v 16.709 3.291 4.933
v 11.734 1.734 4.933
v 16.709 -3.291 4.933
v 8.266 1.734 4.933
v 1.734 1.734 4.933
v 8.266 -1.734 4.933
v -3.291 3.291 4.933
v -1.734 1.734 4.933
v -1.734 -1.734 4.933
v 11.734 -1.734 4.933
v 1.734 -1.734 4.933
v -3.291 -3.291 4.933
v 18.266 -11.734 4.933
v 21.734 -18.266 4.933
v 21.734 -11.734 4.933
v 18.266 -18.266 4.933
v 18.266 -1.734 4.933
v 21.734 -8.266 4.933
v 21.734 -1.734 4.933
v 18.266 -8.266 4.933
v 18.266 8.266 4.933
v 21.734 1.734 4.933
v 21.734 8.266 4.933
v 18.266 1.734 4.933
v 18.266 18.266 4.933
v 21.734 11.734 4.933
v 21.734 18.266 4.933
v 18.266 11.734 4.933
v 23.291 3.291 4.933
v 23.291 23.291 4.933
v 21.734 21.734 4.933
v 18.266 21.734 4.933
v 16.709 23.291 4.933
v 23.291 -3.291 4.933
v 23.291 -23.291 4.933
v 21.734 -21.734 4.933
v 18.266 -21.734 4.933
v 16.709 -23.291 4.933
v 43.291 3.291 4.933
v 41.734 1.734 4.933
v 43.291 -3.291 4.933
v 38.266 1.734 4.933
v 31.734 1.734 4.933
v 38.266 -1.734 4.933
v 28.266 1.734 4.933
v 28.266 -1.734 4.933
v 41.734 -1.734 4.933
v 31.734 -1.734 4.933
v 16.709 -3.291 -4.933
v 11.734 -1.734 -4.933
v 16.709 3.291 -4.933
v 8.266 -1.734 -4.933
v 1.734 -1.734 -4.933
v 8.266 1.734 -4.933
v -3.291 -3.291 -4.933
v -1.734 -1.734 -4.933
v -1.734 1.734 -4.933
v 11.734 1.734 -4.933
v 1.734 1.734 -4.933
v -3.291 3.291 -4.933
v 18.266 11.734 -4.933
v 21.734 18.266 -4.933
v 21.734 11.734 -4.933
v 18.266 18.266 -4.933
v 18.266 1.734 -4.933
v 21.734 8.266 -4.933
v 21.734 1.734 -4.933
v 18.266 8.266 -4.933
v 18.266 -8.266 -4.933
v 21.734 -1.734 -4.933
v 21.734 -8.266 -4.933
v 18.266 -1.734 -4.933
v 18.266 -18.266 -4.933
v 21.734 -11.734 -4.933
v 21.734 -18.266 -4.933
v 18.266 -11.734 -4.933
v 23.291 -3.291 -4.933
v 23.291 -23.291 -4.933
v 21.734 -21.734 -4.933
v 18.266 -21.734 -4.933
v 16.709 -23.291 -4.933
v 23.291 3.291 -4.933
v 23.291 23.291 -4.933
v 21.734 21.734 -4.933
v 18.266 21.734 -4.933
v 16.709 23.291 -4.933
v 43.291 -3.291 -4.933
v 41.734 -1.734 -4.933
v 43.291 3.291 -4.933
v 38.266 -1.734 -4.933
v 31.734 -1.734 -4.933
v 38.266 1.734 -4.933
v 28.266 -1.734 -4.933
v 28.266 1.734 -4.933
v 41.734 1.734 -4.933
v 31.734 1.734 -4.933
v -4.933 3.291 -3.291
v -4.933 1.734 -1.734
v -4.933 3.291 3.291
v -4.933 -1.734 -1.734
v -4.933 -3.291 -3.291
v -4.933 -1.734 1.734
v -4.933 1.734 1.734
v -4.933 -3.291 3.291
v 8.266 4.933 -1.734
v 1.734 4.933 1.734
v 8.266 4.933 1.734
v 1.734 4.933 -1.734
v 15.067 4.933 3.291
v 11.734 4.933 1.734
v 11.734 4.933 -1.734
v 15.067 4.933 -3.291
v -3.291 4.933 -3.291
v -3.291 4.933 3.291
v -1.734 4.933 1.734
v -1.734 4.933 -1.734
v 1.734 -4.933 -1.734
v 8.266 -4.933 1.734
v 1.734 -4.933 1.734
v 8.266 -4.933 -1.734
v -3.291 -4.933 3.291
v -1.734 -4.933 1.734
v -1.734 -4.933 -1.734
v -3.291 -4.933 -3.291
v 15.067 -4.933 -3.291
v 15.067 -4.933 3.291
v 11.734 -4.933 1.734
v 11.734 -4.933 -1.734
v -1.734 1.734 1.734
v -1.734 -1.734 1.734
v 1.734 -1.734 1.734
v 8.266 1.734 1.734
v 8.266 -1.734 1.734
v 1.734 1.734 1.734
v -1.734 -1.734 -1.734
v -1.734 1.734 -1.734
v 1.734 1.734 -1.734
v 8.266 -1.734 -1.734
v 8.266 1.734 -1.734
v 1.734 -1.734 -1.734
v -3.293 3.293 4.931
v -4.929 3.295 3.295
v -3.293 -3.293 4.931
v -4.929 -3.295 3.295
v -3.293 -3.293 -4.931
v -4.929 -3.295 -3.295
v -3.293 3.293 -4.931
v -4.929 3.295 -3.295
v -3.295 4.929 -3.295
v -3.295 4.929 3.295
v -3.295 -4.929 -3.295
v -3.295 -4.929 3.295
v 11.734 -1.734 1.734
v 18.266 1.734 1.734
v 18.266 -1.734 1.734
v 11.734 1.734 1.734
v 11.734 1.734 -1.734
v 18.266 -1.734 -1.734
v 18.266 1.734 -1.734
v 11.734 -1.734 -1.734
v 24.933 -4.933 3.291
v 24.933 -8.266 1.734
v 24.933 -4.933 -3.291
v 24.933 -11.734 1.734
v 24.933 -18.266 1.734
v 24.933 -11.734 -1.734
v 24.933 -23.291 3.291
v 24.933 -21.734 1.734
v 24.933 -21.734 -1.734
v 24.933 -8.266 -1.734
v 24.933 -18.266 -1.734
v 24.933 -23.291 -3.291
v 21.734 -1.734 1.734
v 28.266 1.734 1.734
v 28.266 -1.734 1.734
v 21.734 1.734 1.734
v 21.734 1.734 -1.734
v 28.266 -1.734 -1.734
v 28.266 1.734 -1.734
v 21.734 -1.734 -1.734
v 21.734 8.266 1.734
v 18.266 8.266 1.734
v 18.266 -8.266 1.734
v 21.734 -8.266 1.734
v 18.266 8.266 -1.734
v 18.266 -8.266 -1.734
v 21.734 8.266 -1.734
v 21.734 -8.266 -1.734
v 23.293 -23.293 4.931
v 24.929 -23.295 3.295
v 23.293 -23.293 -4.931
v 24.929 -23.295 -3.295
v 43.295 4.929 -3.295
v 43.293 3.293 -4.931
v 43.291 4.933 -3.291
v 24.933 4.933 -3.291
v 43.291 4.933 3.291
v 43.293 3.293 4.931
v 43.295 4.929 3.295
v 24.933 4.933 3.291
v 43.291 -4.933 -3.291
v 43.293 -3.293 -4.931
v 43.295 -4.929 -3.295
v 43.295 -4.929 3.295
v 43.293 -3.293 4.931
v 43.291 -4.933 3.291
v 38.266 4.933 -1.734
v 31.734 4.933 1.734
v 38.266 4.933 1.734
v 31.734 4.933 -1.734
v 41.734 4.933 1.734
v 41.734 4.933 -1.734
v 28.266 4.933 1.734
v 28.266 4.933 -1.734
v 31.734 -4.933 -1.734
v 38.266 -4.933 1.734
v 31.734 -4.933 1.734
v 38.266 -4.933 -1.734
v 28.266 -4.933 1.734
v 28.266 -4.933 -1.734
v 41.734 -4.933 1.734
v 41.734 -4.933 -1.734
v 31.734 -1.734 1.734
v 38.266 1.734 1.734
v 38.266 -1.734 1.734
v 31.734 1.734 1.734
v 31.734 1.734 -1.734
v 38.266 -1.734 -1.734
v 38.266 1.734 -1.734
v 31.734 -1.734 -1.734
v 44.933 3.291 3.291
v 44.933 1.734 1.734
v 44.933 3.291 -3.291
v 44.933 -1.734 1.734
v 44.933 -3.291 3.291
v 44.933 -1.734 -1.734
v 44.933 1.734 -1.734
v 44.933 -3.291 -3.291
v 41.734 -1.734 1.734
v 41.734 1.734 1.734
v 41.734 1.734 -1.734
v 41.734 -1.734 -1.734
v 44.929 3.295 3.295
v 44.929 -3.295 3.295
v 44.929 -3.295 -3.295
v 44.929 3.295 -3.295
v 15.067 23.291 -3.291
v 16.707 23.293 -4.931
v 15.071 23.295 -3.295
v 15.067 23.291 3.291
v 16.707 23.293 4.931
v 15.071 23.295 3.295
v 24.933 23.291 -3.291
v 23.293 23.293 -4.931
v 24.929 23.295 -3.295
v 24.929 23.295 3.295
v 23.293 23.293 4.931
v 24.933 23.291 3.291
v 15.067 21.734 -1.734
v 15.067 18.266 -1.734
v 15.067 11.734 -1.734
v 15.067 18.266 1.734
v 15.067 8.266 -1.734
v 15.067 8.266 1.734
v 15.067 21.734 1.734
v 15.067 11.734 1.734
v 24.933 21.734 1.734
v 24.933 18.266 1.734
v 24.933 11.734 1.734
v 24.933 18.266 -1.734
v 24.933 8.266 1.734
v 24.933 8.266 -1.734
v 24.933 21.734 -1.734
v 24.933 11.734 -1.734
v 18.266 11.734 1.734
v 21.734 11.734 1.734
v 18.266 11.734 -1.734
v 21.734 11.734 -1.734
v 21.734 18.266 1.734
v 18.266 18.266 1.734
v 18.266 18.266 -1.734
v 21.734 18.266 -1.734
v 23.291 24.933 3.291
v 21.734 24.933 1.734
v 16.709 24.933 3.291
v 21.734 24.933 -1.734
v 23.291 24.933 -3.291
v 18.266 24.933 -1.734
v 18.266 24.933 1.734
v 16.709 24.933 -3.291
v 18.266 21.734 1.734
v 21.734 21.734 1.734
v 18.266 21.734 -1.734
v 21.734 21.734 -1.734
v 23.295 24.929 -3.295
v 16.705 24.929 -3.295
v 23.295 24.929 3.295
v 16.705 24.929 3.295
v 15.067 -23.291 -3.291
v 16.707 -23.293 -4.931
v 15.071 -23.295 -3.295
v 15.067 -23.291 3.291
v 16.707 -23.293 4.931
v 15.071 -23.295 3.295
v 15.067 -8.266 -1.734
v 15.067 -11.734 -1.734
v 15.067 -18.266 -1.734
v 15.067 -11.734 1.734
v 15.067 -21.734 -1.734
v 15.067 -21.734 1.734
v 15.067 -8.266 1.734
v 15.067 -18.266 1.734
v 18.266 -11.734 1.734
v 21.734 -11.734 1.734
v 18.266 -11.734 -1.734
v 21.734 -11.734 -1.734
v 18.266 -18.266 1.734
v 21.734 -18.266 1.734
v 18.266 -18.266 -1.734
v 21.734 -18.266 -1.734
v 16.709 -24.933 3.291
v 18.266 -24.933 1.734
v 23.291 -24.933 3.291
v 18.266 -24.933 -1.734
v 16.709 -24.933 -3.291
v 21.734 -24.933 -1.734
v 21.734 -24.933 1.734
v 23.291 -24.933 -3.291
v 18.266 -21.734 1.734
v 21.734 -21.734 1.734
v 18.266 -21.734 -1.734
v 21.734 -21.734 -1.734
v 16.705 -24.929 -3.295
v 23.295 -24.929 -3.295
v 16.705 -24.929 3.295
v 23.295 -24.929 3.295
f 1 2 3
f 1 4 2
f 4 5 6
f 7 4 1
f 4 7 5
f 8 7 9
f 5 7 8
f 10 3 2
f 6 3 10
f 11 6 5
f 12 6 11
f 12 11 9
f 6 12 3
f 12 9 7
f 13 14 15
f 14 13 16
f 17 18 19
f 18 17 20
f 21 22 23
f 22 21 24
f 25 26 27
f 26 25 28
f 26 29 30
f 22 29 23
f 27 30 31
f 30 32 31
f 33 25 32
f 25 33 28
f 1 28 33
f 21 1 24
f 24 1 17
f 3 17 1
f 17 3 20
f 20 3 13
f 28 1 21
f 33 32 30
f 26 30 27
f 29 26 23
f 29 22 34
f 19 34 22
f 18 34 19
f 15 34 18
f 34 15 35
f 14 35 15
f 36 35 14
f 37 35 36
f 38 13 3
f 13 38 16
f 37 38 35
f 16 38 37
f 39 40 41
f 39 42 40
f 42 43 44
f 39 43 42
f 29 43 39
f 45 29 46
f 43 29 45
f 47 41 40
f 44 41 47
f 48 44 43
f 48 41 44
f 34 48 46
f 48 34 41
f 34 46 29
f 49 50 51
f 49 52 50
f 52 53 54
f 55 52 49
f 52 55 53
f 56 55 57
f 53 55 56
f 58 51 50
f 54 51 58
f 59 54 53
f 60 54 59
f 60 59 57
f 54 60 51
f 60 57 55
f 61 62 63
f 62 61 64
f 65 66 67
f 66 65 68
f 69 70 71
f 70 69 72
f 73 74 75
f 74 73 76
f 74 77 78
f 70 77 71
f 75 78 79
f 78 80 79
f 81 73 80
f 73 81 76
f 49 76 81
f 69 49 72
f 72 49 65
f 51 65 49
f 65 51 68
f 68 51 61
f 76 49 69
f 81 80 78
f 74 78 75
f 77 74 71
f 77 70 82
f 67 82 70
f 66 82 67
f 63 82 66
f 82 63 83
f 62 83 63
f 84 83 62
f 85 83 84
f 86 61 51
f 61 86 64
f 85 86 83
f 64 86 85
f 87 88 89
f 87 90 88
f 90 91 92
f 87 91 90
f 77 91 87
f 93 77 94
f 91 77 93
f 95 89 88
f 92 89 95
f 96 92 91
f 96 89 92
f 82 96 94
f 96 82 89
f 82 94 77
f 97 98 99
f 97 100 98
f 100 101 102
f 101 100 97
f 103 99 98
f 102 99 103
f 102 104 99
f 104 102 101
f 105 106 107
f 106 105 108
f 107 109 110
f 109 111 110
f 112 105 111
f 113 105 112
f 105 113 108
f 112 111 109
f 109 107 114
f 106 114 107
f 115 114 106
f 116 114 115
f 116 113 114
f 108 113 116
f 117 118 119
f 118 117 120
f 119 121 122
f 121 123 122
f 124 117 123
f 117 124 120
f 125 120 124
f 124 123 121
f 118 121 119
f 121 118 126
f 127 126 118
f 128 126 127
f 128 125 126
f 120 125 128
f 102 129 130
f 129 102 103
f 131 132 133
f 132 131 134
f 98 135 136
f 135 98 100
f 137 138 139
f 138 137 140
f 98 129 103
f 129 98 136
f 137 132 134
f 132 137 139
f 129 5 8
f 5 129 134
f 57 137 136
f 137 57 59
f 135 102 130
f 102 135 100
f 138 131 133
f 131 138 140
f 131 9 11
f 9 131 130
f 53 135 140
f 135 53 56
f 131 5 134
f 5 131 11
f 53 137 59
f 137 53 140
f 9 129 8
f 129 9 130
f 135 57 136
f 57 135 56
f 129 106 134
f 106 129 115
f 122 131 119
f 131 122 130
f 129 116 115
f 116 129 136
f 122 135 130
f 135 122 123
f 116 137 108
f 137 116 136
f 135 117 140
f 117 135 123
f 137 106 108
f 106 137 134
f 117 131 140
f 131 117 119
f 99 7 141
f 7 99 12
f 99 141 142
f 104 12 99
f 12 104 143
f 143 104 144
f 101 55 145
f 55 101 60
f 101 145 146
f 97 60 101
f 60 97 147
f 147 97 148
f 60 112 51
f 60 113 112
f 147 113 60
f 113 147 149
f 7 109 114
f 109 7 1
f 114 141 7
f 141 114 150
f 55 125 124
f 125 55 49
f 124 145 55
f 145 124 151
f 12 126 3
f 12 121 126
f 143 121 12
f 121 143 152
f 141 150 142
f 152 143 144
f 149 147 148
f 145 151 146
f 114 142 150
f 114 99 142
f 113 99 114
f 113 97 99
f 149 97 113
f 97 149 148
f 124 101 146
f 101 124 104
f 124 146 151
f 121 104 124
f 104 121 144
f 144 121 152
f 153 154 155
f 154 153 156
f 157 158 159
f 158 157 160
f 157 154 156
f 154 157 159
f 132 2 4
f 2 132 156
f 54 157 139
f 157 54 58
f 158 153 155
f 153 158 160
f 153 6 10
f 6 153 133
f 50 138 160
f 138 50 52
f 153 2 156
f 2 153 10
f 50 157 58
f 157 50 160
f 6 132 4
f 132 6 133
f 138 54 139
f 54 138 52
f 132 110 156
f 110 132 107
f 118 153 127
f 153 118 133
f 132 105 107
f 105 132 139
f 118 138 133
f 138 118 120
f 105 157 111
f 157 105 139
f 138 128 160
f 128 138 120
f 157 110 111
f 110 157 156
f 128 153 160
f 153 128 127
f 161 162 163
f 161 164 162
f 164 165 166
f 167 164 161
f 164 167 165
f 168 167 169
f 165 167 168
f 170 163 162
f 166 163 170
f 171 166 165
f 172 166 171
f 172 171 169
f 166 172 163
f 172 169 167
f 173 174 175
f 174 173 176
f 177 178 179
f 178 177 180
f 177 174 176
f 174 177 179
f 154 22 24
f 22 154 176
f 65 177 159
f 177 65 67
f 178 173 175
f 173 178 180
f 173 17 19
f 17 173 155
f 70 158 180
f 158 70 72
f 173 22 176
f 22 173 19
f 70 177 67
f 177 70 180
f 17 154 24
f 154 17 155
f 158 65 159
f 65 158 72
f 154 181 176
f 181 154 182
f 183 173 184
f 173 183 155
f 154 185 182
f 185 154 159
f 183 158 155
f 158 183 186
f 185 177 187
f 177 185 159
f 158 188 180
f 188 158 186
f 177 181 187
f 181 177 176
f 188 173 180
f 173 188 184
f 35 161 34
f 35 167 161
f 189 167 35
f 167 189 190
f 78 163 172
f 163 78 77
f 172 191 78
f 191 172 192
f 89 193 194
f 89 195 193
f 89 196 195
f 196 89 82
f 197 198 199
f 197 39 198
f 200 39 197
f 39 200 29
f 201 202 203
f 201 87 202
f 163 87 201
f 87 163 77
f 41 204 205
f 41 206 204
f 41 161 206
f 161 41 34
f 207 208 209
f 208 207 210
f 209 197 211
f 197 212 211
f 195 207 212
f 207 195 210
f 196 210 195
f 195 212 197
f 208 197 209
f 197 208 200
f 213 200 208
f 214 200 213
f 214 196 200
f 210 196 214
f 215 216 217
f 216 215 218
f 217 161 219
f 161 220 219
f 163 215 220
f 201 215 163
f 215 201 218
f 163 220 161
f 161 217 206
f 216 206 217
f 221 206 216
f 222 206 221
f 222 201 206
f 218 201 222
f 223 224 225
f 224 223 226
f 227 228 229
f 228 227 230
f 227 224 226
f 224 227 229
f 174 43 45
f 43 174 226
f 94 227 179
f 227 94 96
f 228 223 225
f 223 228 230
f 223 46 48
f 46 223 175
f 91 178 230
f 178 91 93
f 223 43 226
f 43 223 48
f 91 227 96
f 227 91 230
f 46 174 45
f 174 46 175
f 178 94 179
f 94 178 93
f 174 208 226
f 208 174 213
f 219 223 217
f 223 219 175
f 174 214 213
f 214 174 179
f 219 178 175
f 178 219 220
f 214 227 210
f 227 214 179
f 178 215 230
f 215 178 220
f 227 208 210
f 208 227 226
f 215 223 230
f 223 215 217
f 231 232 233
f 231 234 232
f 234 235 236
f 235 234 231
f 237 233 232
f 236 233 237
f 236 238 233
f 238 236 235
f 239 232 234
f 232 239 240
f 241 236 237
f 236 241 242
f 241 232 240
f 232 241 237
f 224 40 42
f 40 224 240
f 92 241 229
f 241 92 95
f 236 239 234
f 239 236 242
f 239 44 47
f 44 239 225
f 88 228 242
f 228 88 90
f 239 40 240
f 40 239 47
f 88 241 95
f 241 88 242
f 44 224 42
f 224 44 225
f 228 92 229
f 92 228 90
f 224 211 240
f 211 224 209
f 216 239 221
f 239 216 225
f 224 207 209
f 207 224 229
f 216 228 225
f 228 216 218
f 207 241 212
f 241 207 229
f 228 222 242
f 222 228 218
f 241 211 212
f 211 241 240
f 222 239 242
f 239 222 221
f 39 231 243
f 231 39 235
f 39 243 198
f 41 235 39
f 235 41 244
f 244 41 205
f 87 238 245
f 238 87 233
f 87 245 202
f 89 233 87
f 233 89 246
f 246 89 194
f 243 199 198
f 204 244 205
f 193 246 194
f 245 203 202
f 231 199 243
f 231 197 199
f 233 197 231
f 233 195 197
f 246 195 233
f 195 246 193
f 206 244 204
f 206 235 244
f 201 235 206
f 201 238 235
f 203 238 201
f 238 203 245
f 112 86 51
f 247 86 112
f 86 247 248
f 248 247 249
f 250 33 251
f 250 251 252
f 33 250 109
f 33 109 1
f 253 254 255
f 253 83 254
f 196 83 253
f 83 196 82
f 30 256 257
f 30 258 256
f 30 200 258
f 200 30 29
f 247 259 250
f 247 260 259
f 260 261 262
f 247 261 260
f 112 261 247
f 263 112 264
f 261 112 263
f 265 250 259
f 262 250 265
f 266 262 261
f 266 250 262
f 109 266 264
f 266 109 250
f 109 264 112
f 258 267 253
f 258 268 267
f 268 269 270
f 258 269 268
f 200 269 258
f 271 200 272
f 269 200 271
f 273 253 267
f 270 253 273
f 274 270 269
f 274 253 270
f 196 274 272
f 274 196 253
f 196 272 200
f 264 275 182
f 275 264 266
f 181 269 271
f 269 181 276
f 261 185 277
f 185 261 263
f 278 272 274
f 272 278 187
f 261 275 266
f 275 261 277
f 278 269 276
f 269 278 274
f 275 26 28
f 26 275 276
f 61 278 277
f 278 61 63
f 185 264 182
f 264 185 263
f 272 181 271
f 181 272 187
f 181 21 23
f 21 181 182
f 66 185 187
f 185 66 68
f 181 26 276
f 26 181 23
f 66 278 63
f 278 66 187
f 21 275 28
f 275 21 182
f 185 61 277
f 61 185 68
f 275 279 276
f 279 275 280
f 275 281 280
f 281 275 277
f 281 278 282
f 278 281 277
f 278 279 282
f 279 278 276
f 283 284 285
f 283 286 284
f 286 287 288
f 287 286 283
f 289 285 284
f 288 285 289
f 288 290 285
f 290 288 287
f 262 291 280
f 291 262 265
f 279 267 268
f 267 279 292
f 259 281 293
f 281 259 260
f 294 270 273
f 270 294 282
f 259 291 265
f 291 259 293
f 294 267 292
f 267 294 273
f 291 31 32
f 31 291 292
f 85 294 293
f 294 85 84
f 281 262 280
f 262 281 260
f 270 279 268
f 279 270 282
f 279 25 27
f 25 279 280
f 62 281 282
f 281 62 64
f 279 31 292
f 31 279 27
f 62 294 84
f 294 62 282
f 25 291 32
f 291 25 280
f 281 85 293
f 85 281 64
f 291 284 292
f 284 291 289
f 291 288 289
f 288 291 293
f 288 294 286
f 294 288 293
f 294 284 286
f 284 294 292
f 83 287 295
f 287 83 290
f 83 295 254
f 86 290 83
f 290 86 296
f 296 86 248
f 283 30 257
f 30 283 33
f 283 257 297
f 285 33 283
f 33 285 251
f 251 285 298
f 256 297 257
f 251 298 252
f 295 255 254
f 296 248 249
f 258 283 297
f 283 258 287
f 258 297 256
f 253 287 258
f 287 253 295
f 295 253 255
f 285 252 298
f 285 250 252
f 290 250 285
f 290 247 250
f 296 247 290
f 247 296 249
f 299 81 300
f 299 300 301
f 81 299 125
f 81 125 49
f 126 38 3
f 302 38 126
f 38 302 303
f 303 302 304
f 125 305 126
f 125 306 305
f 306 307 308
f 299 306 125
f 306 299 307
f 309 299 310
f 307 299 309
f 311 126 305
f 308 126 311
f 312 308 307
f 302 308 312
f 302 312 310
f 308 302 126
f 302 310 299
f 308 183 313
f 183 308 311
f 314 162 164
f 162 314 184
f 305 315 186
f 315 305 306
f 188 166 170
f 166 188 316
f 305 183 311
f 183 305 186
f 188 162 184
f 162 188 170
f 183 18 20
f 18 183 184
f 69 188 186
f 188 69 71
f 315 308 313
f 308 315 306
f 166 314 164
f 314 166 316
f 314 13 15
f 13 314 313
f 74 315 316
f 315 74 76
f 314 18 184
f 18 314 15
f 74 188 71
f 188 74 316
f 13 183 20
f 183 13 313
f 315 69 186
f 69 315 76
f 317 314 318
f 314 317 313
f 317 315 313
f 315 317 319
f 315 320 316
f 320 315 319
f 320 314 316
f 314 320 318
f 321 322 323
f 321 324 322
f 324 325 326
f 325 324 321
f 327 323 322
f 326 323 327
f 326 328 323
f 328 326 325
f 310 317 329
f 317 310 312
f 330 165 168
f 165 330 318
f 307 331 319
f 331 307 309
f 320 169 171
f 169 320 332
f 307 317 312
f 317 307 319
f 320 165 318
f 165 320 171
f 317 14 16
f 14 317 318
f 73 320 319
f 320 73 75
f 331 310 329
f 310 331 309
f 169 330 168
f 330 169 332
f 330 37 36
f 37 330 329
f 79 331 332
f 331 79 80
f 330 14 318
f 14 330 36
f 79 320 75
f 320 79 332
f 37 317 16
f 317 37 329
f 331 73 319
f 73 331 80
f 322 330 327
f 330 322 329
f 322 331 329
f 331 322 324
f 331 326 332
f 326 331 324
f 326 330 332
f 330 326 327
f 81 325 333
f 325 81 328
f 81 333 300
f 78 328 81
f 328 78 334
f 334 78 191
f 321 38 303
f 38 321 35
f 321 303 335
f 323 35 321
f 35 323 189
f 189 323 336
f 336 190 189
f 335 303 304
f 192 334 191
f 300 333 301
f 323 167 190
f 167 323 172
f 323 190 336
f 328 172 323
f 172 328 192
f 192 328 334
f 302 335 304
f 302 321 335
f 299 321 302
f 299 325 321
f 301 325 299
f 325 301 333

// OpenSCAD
// STEAMWare Export Name: cross
// STEAMWare Export Directory: homemryanDocumentsSteamware
// STEAMWare Track String Identity: XXXXAAYYBBBB

// Initial Basis Unit : 10.0
// Fit Padding : 0.134
// Initial Mass Type: O


use <steamware.scad>;

translate( [ 0, 0, 0 ] ) { optimized_block( 10.0 , 0.134 ); }
translate( [ 5.0, 0, 0 ] ) { rotate ( [ 0, 0, 0 ] ) { optimized_coupler( 10.0 , 0.134 ); } }
translate( [ 10.0, 0, 0 ] ) { optimized_block( 10.0 , 0.134 ); }
translate( [ 15.0, 0, 0 ] ) { rotate ( [ 0, 0, 0 ] ) { optimized_coupler( 10.0 , 0.134 ); } }
translate( [ 20.0, 0, 0 ] ) { optimized_block( 10.0 , 0.134 ); }
translate( [ 25.0, 0, 0 ] ) { rotate ( [ 0, 0, 0 ] ) { optimized_coupler( 10.0 , 0.134 ); } }
translate( [ 30.0, 0, 0 ] ) { optimized_block( 10.0 , 0.134 ); }
translate( [ 35.0, 0, 0 ] ) { rotate ( [ 0, 0, 0 ] ) { optimized_coupler( 10.0 , 0.134 ); } }
translate( [ 40.0, 0, 0 ] ) { optimized_block( 10.0 , 0.134 ); }
translate( [ 35.0, 0, 0 ] ) { rotate ( [ 0, 0, 0 ] ) { optimized_coupler( 10.0 , 0.134 ); } }
translate( [ 30.0, 0, 0 ] ) { optimized_block( 10.0 , 0.134 ); }
translate( [ 25.0, 0, 0 ] ) { rotate ( [ 0, 0, 0 ] ) { optimized_coupler( 10.0 , 0.134 ); } }
translate( [ 20.0, 0, 0 ] ) { optimized_block( 10.0 , 0.134 ); }
translate( [ 20.0, 5.0, 0 ] ) { rotate ( [ 0, 0, 90 ] ) { optimized_coupler( 10.0 , 0.134 ); } }
translate( [ 20.0, 10.0, 0 ] ) { optimized_block( 10.0 , 0.134 ); }
translate( [ 20.0, 15.0, 0 ] ) { rotate ( [ 0, 0, 90 ] ) { optimized_coupler( 10.0 , 0.134 ); } }
translate( [ 20.0, 20.0, 0 ] ) { optimized_block( 10.0 , 0.134 ); }
translate( [ 20.0, 15.0, 0 ] ) { rotate ( [ 0, 0, -90 ] ) { optimized_coupler( 10.0 , 0.134 ); } }
translate( [ 20.0, 10.0, 0 ] ) { optimized_block( 10.0 , 0.134 ); }
translate( [ 20.0, 5.0, 0 ] ) { rotate ( [ 0, 0, -90 ] ) { optimized_coupler( 10.0 , 0.134 ); } }
translate( [ 20.0, 0.0, 0 ] ) { optimized_block( 10.0 , 0.134 ); }
translate( [ 20.0, -5.0, 0 ] ) { rotate ( [ 0, 0, -90 ] ) { optimized_coupler( 10.0 , 0.134 ); } }
translate( [ 20.0, -10.0, 0 ] ) { optimized_block( 10.0 , 0.134 ); }
translate( [ 20.0, -15.0, 0 ] ) { rotate ( [ 0, 0, -90 ] ) { optimized_coupler( 10.0 , 0.134 ); } }
translate( [ 20.0, -20.0, 0 ] ) { optimized_block( 10.0 , 0.134 ); }
